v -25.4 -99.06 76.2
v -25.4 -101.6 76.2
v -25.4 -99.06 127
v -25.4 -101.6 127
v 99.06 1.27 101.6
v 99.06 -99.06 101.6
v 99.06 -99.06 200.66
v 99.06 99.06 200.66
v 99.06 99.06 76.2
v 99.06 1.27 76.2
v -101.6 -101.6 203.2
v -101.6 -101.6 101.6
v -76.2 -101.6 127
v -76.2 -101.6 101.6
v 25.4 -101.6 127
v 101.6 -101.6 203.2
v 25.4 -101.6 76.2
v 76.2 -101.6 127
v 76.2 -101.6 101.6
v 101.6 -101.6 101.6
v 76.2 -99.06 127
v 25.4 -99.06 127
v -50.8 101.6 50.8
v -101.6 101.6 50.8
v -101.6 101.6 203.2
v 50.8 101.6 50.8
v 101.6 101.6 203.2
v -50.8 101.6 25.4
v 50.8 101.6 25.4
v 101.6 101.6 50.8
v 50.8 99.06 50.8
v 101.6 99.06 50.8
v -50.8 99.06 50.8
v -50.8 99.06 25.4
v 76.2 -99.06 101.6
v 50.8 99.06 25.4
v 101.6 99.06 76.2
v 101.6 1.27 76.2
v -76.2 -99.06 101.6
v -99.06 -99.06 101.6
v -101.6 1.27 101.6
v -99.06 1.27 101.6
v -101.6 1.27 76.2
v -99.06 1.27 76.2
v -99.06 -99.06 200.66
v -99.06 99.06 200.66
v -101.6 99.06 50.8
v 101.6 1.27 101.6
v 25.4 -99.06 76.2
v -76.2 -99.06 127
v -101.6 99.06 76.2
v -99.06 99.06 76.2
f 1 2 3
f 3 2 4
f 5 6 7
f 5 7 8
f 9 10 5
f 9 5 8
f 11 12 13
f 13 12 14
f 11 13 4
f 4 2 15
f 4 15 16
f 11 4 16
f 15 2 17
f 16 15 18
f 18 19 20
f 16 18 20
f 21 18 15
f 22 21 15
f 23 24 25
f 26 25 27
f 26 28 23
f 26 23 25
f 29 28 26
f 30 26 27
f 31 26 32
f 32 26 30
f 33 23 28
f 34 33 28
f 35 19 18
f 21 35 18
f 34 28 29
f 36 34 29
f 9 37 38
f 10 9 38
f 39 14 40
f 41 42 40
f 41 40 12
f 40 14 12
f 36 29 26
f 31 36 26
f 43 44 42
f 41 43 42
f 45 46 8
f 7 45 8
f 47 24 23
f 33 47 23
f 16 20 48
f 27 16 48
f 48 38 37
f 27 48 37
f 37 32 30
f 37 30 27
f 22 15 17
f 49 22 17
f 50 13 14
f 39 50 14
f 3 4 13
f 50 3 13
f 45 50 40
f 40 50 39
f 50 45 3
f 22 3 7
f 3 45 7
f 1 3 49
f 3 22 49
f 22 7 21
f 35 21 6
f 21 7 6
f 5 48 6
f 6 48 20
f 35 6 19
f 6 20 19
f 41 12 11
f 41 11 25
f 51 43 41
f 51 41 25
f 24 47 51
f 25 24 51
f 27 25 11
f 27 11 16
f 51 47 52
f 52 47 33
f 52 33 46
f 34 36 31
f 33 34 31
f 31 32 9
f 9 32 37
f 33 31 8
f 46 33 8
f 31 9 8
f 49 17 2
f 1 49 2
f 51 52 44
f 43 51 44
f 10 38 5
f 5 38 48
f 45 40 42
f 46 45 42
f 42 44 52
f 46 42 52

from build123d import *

# Parameters (mm, degrees)
F0_W      = 203.2
F0_H      = 203.2
F1_DEPTH  = 203.2
F2_W      = 198.12
F2_H      = 198.12
F3_DEPTH  = 200.66
F7_DEPTH  = 203.201
F10_DEPTH = 2.54
F13_DEPTH = 2.54


with BuildPart() as f1:
    # F0 (on Top) → F1 (new body)
    with BuildSketch(Plane.XY):
        Rectangle(F0_W, F0_H)
    extrude(amount=F1_DEPTH)

    # F2 (on Top) → F3 (cut)
    with BuildSketch(Plane.XY):
        Rectangle(F2_W, F2_H)
    extrude(amount=F3_DEPTH, mode=Mode.SUBTRACT)

    # F6 (on offset) → F7 (cut, through all)
    with BuildSketch(Plane.YZ.offset(101.6)):
        Polygon((1.27, 76.2), (1.27, 101.6), (-99.06, 101.6), (-99.06, 0), (99.06, 0), (99.06, 76.2), align=None)
    extrude(amount=-F7_DEPTH, mode=Mode.SUBTRACT)

    # F9 (on offset) → F10 (cut, through all)
    with BuildSketch(Plane(origin=(0, 101.6, 0), x_dir=(-1, 0, 0), z_dir=(0, 1, 0))):
        Polygon((-101.6, 0), (101.6, 0), (101.6, 25.4), (101.6, 50.8), (50.8, 50.8), (50.8, 25.4), (-50.8, 25.4), (-50.8, 50.8), (-101.6, 50.8), (-101.6, 25.4), align=None)
    extrude(amount=-F10_DEPTH, mode=Mode.SUBTRACT)

    # F12 (on offset) → F13 (cut, through all)
    with BuildSketch(Plane.XZ.offset(101.6)):
        Polygon((-101.6, 101.6), (-101.6, 0), (101.6, 0), (101.6, 101.6), (76.2, 101.6), (76.2, 127), (25.4, 127), (25.4, 101.6), (25.4, 76.2), (-25.4, 76.2), (-25.4, 101.6), (-25.4, 127), (-76.2, 127), (-76.2, 101.6), align=None)
    extrude(amount=-F13_DEPTH, mode=Mode.SUBTRACT)


solid = f1.part
